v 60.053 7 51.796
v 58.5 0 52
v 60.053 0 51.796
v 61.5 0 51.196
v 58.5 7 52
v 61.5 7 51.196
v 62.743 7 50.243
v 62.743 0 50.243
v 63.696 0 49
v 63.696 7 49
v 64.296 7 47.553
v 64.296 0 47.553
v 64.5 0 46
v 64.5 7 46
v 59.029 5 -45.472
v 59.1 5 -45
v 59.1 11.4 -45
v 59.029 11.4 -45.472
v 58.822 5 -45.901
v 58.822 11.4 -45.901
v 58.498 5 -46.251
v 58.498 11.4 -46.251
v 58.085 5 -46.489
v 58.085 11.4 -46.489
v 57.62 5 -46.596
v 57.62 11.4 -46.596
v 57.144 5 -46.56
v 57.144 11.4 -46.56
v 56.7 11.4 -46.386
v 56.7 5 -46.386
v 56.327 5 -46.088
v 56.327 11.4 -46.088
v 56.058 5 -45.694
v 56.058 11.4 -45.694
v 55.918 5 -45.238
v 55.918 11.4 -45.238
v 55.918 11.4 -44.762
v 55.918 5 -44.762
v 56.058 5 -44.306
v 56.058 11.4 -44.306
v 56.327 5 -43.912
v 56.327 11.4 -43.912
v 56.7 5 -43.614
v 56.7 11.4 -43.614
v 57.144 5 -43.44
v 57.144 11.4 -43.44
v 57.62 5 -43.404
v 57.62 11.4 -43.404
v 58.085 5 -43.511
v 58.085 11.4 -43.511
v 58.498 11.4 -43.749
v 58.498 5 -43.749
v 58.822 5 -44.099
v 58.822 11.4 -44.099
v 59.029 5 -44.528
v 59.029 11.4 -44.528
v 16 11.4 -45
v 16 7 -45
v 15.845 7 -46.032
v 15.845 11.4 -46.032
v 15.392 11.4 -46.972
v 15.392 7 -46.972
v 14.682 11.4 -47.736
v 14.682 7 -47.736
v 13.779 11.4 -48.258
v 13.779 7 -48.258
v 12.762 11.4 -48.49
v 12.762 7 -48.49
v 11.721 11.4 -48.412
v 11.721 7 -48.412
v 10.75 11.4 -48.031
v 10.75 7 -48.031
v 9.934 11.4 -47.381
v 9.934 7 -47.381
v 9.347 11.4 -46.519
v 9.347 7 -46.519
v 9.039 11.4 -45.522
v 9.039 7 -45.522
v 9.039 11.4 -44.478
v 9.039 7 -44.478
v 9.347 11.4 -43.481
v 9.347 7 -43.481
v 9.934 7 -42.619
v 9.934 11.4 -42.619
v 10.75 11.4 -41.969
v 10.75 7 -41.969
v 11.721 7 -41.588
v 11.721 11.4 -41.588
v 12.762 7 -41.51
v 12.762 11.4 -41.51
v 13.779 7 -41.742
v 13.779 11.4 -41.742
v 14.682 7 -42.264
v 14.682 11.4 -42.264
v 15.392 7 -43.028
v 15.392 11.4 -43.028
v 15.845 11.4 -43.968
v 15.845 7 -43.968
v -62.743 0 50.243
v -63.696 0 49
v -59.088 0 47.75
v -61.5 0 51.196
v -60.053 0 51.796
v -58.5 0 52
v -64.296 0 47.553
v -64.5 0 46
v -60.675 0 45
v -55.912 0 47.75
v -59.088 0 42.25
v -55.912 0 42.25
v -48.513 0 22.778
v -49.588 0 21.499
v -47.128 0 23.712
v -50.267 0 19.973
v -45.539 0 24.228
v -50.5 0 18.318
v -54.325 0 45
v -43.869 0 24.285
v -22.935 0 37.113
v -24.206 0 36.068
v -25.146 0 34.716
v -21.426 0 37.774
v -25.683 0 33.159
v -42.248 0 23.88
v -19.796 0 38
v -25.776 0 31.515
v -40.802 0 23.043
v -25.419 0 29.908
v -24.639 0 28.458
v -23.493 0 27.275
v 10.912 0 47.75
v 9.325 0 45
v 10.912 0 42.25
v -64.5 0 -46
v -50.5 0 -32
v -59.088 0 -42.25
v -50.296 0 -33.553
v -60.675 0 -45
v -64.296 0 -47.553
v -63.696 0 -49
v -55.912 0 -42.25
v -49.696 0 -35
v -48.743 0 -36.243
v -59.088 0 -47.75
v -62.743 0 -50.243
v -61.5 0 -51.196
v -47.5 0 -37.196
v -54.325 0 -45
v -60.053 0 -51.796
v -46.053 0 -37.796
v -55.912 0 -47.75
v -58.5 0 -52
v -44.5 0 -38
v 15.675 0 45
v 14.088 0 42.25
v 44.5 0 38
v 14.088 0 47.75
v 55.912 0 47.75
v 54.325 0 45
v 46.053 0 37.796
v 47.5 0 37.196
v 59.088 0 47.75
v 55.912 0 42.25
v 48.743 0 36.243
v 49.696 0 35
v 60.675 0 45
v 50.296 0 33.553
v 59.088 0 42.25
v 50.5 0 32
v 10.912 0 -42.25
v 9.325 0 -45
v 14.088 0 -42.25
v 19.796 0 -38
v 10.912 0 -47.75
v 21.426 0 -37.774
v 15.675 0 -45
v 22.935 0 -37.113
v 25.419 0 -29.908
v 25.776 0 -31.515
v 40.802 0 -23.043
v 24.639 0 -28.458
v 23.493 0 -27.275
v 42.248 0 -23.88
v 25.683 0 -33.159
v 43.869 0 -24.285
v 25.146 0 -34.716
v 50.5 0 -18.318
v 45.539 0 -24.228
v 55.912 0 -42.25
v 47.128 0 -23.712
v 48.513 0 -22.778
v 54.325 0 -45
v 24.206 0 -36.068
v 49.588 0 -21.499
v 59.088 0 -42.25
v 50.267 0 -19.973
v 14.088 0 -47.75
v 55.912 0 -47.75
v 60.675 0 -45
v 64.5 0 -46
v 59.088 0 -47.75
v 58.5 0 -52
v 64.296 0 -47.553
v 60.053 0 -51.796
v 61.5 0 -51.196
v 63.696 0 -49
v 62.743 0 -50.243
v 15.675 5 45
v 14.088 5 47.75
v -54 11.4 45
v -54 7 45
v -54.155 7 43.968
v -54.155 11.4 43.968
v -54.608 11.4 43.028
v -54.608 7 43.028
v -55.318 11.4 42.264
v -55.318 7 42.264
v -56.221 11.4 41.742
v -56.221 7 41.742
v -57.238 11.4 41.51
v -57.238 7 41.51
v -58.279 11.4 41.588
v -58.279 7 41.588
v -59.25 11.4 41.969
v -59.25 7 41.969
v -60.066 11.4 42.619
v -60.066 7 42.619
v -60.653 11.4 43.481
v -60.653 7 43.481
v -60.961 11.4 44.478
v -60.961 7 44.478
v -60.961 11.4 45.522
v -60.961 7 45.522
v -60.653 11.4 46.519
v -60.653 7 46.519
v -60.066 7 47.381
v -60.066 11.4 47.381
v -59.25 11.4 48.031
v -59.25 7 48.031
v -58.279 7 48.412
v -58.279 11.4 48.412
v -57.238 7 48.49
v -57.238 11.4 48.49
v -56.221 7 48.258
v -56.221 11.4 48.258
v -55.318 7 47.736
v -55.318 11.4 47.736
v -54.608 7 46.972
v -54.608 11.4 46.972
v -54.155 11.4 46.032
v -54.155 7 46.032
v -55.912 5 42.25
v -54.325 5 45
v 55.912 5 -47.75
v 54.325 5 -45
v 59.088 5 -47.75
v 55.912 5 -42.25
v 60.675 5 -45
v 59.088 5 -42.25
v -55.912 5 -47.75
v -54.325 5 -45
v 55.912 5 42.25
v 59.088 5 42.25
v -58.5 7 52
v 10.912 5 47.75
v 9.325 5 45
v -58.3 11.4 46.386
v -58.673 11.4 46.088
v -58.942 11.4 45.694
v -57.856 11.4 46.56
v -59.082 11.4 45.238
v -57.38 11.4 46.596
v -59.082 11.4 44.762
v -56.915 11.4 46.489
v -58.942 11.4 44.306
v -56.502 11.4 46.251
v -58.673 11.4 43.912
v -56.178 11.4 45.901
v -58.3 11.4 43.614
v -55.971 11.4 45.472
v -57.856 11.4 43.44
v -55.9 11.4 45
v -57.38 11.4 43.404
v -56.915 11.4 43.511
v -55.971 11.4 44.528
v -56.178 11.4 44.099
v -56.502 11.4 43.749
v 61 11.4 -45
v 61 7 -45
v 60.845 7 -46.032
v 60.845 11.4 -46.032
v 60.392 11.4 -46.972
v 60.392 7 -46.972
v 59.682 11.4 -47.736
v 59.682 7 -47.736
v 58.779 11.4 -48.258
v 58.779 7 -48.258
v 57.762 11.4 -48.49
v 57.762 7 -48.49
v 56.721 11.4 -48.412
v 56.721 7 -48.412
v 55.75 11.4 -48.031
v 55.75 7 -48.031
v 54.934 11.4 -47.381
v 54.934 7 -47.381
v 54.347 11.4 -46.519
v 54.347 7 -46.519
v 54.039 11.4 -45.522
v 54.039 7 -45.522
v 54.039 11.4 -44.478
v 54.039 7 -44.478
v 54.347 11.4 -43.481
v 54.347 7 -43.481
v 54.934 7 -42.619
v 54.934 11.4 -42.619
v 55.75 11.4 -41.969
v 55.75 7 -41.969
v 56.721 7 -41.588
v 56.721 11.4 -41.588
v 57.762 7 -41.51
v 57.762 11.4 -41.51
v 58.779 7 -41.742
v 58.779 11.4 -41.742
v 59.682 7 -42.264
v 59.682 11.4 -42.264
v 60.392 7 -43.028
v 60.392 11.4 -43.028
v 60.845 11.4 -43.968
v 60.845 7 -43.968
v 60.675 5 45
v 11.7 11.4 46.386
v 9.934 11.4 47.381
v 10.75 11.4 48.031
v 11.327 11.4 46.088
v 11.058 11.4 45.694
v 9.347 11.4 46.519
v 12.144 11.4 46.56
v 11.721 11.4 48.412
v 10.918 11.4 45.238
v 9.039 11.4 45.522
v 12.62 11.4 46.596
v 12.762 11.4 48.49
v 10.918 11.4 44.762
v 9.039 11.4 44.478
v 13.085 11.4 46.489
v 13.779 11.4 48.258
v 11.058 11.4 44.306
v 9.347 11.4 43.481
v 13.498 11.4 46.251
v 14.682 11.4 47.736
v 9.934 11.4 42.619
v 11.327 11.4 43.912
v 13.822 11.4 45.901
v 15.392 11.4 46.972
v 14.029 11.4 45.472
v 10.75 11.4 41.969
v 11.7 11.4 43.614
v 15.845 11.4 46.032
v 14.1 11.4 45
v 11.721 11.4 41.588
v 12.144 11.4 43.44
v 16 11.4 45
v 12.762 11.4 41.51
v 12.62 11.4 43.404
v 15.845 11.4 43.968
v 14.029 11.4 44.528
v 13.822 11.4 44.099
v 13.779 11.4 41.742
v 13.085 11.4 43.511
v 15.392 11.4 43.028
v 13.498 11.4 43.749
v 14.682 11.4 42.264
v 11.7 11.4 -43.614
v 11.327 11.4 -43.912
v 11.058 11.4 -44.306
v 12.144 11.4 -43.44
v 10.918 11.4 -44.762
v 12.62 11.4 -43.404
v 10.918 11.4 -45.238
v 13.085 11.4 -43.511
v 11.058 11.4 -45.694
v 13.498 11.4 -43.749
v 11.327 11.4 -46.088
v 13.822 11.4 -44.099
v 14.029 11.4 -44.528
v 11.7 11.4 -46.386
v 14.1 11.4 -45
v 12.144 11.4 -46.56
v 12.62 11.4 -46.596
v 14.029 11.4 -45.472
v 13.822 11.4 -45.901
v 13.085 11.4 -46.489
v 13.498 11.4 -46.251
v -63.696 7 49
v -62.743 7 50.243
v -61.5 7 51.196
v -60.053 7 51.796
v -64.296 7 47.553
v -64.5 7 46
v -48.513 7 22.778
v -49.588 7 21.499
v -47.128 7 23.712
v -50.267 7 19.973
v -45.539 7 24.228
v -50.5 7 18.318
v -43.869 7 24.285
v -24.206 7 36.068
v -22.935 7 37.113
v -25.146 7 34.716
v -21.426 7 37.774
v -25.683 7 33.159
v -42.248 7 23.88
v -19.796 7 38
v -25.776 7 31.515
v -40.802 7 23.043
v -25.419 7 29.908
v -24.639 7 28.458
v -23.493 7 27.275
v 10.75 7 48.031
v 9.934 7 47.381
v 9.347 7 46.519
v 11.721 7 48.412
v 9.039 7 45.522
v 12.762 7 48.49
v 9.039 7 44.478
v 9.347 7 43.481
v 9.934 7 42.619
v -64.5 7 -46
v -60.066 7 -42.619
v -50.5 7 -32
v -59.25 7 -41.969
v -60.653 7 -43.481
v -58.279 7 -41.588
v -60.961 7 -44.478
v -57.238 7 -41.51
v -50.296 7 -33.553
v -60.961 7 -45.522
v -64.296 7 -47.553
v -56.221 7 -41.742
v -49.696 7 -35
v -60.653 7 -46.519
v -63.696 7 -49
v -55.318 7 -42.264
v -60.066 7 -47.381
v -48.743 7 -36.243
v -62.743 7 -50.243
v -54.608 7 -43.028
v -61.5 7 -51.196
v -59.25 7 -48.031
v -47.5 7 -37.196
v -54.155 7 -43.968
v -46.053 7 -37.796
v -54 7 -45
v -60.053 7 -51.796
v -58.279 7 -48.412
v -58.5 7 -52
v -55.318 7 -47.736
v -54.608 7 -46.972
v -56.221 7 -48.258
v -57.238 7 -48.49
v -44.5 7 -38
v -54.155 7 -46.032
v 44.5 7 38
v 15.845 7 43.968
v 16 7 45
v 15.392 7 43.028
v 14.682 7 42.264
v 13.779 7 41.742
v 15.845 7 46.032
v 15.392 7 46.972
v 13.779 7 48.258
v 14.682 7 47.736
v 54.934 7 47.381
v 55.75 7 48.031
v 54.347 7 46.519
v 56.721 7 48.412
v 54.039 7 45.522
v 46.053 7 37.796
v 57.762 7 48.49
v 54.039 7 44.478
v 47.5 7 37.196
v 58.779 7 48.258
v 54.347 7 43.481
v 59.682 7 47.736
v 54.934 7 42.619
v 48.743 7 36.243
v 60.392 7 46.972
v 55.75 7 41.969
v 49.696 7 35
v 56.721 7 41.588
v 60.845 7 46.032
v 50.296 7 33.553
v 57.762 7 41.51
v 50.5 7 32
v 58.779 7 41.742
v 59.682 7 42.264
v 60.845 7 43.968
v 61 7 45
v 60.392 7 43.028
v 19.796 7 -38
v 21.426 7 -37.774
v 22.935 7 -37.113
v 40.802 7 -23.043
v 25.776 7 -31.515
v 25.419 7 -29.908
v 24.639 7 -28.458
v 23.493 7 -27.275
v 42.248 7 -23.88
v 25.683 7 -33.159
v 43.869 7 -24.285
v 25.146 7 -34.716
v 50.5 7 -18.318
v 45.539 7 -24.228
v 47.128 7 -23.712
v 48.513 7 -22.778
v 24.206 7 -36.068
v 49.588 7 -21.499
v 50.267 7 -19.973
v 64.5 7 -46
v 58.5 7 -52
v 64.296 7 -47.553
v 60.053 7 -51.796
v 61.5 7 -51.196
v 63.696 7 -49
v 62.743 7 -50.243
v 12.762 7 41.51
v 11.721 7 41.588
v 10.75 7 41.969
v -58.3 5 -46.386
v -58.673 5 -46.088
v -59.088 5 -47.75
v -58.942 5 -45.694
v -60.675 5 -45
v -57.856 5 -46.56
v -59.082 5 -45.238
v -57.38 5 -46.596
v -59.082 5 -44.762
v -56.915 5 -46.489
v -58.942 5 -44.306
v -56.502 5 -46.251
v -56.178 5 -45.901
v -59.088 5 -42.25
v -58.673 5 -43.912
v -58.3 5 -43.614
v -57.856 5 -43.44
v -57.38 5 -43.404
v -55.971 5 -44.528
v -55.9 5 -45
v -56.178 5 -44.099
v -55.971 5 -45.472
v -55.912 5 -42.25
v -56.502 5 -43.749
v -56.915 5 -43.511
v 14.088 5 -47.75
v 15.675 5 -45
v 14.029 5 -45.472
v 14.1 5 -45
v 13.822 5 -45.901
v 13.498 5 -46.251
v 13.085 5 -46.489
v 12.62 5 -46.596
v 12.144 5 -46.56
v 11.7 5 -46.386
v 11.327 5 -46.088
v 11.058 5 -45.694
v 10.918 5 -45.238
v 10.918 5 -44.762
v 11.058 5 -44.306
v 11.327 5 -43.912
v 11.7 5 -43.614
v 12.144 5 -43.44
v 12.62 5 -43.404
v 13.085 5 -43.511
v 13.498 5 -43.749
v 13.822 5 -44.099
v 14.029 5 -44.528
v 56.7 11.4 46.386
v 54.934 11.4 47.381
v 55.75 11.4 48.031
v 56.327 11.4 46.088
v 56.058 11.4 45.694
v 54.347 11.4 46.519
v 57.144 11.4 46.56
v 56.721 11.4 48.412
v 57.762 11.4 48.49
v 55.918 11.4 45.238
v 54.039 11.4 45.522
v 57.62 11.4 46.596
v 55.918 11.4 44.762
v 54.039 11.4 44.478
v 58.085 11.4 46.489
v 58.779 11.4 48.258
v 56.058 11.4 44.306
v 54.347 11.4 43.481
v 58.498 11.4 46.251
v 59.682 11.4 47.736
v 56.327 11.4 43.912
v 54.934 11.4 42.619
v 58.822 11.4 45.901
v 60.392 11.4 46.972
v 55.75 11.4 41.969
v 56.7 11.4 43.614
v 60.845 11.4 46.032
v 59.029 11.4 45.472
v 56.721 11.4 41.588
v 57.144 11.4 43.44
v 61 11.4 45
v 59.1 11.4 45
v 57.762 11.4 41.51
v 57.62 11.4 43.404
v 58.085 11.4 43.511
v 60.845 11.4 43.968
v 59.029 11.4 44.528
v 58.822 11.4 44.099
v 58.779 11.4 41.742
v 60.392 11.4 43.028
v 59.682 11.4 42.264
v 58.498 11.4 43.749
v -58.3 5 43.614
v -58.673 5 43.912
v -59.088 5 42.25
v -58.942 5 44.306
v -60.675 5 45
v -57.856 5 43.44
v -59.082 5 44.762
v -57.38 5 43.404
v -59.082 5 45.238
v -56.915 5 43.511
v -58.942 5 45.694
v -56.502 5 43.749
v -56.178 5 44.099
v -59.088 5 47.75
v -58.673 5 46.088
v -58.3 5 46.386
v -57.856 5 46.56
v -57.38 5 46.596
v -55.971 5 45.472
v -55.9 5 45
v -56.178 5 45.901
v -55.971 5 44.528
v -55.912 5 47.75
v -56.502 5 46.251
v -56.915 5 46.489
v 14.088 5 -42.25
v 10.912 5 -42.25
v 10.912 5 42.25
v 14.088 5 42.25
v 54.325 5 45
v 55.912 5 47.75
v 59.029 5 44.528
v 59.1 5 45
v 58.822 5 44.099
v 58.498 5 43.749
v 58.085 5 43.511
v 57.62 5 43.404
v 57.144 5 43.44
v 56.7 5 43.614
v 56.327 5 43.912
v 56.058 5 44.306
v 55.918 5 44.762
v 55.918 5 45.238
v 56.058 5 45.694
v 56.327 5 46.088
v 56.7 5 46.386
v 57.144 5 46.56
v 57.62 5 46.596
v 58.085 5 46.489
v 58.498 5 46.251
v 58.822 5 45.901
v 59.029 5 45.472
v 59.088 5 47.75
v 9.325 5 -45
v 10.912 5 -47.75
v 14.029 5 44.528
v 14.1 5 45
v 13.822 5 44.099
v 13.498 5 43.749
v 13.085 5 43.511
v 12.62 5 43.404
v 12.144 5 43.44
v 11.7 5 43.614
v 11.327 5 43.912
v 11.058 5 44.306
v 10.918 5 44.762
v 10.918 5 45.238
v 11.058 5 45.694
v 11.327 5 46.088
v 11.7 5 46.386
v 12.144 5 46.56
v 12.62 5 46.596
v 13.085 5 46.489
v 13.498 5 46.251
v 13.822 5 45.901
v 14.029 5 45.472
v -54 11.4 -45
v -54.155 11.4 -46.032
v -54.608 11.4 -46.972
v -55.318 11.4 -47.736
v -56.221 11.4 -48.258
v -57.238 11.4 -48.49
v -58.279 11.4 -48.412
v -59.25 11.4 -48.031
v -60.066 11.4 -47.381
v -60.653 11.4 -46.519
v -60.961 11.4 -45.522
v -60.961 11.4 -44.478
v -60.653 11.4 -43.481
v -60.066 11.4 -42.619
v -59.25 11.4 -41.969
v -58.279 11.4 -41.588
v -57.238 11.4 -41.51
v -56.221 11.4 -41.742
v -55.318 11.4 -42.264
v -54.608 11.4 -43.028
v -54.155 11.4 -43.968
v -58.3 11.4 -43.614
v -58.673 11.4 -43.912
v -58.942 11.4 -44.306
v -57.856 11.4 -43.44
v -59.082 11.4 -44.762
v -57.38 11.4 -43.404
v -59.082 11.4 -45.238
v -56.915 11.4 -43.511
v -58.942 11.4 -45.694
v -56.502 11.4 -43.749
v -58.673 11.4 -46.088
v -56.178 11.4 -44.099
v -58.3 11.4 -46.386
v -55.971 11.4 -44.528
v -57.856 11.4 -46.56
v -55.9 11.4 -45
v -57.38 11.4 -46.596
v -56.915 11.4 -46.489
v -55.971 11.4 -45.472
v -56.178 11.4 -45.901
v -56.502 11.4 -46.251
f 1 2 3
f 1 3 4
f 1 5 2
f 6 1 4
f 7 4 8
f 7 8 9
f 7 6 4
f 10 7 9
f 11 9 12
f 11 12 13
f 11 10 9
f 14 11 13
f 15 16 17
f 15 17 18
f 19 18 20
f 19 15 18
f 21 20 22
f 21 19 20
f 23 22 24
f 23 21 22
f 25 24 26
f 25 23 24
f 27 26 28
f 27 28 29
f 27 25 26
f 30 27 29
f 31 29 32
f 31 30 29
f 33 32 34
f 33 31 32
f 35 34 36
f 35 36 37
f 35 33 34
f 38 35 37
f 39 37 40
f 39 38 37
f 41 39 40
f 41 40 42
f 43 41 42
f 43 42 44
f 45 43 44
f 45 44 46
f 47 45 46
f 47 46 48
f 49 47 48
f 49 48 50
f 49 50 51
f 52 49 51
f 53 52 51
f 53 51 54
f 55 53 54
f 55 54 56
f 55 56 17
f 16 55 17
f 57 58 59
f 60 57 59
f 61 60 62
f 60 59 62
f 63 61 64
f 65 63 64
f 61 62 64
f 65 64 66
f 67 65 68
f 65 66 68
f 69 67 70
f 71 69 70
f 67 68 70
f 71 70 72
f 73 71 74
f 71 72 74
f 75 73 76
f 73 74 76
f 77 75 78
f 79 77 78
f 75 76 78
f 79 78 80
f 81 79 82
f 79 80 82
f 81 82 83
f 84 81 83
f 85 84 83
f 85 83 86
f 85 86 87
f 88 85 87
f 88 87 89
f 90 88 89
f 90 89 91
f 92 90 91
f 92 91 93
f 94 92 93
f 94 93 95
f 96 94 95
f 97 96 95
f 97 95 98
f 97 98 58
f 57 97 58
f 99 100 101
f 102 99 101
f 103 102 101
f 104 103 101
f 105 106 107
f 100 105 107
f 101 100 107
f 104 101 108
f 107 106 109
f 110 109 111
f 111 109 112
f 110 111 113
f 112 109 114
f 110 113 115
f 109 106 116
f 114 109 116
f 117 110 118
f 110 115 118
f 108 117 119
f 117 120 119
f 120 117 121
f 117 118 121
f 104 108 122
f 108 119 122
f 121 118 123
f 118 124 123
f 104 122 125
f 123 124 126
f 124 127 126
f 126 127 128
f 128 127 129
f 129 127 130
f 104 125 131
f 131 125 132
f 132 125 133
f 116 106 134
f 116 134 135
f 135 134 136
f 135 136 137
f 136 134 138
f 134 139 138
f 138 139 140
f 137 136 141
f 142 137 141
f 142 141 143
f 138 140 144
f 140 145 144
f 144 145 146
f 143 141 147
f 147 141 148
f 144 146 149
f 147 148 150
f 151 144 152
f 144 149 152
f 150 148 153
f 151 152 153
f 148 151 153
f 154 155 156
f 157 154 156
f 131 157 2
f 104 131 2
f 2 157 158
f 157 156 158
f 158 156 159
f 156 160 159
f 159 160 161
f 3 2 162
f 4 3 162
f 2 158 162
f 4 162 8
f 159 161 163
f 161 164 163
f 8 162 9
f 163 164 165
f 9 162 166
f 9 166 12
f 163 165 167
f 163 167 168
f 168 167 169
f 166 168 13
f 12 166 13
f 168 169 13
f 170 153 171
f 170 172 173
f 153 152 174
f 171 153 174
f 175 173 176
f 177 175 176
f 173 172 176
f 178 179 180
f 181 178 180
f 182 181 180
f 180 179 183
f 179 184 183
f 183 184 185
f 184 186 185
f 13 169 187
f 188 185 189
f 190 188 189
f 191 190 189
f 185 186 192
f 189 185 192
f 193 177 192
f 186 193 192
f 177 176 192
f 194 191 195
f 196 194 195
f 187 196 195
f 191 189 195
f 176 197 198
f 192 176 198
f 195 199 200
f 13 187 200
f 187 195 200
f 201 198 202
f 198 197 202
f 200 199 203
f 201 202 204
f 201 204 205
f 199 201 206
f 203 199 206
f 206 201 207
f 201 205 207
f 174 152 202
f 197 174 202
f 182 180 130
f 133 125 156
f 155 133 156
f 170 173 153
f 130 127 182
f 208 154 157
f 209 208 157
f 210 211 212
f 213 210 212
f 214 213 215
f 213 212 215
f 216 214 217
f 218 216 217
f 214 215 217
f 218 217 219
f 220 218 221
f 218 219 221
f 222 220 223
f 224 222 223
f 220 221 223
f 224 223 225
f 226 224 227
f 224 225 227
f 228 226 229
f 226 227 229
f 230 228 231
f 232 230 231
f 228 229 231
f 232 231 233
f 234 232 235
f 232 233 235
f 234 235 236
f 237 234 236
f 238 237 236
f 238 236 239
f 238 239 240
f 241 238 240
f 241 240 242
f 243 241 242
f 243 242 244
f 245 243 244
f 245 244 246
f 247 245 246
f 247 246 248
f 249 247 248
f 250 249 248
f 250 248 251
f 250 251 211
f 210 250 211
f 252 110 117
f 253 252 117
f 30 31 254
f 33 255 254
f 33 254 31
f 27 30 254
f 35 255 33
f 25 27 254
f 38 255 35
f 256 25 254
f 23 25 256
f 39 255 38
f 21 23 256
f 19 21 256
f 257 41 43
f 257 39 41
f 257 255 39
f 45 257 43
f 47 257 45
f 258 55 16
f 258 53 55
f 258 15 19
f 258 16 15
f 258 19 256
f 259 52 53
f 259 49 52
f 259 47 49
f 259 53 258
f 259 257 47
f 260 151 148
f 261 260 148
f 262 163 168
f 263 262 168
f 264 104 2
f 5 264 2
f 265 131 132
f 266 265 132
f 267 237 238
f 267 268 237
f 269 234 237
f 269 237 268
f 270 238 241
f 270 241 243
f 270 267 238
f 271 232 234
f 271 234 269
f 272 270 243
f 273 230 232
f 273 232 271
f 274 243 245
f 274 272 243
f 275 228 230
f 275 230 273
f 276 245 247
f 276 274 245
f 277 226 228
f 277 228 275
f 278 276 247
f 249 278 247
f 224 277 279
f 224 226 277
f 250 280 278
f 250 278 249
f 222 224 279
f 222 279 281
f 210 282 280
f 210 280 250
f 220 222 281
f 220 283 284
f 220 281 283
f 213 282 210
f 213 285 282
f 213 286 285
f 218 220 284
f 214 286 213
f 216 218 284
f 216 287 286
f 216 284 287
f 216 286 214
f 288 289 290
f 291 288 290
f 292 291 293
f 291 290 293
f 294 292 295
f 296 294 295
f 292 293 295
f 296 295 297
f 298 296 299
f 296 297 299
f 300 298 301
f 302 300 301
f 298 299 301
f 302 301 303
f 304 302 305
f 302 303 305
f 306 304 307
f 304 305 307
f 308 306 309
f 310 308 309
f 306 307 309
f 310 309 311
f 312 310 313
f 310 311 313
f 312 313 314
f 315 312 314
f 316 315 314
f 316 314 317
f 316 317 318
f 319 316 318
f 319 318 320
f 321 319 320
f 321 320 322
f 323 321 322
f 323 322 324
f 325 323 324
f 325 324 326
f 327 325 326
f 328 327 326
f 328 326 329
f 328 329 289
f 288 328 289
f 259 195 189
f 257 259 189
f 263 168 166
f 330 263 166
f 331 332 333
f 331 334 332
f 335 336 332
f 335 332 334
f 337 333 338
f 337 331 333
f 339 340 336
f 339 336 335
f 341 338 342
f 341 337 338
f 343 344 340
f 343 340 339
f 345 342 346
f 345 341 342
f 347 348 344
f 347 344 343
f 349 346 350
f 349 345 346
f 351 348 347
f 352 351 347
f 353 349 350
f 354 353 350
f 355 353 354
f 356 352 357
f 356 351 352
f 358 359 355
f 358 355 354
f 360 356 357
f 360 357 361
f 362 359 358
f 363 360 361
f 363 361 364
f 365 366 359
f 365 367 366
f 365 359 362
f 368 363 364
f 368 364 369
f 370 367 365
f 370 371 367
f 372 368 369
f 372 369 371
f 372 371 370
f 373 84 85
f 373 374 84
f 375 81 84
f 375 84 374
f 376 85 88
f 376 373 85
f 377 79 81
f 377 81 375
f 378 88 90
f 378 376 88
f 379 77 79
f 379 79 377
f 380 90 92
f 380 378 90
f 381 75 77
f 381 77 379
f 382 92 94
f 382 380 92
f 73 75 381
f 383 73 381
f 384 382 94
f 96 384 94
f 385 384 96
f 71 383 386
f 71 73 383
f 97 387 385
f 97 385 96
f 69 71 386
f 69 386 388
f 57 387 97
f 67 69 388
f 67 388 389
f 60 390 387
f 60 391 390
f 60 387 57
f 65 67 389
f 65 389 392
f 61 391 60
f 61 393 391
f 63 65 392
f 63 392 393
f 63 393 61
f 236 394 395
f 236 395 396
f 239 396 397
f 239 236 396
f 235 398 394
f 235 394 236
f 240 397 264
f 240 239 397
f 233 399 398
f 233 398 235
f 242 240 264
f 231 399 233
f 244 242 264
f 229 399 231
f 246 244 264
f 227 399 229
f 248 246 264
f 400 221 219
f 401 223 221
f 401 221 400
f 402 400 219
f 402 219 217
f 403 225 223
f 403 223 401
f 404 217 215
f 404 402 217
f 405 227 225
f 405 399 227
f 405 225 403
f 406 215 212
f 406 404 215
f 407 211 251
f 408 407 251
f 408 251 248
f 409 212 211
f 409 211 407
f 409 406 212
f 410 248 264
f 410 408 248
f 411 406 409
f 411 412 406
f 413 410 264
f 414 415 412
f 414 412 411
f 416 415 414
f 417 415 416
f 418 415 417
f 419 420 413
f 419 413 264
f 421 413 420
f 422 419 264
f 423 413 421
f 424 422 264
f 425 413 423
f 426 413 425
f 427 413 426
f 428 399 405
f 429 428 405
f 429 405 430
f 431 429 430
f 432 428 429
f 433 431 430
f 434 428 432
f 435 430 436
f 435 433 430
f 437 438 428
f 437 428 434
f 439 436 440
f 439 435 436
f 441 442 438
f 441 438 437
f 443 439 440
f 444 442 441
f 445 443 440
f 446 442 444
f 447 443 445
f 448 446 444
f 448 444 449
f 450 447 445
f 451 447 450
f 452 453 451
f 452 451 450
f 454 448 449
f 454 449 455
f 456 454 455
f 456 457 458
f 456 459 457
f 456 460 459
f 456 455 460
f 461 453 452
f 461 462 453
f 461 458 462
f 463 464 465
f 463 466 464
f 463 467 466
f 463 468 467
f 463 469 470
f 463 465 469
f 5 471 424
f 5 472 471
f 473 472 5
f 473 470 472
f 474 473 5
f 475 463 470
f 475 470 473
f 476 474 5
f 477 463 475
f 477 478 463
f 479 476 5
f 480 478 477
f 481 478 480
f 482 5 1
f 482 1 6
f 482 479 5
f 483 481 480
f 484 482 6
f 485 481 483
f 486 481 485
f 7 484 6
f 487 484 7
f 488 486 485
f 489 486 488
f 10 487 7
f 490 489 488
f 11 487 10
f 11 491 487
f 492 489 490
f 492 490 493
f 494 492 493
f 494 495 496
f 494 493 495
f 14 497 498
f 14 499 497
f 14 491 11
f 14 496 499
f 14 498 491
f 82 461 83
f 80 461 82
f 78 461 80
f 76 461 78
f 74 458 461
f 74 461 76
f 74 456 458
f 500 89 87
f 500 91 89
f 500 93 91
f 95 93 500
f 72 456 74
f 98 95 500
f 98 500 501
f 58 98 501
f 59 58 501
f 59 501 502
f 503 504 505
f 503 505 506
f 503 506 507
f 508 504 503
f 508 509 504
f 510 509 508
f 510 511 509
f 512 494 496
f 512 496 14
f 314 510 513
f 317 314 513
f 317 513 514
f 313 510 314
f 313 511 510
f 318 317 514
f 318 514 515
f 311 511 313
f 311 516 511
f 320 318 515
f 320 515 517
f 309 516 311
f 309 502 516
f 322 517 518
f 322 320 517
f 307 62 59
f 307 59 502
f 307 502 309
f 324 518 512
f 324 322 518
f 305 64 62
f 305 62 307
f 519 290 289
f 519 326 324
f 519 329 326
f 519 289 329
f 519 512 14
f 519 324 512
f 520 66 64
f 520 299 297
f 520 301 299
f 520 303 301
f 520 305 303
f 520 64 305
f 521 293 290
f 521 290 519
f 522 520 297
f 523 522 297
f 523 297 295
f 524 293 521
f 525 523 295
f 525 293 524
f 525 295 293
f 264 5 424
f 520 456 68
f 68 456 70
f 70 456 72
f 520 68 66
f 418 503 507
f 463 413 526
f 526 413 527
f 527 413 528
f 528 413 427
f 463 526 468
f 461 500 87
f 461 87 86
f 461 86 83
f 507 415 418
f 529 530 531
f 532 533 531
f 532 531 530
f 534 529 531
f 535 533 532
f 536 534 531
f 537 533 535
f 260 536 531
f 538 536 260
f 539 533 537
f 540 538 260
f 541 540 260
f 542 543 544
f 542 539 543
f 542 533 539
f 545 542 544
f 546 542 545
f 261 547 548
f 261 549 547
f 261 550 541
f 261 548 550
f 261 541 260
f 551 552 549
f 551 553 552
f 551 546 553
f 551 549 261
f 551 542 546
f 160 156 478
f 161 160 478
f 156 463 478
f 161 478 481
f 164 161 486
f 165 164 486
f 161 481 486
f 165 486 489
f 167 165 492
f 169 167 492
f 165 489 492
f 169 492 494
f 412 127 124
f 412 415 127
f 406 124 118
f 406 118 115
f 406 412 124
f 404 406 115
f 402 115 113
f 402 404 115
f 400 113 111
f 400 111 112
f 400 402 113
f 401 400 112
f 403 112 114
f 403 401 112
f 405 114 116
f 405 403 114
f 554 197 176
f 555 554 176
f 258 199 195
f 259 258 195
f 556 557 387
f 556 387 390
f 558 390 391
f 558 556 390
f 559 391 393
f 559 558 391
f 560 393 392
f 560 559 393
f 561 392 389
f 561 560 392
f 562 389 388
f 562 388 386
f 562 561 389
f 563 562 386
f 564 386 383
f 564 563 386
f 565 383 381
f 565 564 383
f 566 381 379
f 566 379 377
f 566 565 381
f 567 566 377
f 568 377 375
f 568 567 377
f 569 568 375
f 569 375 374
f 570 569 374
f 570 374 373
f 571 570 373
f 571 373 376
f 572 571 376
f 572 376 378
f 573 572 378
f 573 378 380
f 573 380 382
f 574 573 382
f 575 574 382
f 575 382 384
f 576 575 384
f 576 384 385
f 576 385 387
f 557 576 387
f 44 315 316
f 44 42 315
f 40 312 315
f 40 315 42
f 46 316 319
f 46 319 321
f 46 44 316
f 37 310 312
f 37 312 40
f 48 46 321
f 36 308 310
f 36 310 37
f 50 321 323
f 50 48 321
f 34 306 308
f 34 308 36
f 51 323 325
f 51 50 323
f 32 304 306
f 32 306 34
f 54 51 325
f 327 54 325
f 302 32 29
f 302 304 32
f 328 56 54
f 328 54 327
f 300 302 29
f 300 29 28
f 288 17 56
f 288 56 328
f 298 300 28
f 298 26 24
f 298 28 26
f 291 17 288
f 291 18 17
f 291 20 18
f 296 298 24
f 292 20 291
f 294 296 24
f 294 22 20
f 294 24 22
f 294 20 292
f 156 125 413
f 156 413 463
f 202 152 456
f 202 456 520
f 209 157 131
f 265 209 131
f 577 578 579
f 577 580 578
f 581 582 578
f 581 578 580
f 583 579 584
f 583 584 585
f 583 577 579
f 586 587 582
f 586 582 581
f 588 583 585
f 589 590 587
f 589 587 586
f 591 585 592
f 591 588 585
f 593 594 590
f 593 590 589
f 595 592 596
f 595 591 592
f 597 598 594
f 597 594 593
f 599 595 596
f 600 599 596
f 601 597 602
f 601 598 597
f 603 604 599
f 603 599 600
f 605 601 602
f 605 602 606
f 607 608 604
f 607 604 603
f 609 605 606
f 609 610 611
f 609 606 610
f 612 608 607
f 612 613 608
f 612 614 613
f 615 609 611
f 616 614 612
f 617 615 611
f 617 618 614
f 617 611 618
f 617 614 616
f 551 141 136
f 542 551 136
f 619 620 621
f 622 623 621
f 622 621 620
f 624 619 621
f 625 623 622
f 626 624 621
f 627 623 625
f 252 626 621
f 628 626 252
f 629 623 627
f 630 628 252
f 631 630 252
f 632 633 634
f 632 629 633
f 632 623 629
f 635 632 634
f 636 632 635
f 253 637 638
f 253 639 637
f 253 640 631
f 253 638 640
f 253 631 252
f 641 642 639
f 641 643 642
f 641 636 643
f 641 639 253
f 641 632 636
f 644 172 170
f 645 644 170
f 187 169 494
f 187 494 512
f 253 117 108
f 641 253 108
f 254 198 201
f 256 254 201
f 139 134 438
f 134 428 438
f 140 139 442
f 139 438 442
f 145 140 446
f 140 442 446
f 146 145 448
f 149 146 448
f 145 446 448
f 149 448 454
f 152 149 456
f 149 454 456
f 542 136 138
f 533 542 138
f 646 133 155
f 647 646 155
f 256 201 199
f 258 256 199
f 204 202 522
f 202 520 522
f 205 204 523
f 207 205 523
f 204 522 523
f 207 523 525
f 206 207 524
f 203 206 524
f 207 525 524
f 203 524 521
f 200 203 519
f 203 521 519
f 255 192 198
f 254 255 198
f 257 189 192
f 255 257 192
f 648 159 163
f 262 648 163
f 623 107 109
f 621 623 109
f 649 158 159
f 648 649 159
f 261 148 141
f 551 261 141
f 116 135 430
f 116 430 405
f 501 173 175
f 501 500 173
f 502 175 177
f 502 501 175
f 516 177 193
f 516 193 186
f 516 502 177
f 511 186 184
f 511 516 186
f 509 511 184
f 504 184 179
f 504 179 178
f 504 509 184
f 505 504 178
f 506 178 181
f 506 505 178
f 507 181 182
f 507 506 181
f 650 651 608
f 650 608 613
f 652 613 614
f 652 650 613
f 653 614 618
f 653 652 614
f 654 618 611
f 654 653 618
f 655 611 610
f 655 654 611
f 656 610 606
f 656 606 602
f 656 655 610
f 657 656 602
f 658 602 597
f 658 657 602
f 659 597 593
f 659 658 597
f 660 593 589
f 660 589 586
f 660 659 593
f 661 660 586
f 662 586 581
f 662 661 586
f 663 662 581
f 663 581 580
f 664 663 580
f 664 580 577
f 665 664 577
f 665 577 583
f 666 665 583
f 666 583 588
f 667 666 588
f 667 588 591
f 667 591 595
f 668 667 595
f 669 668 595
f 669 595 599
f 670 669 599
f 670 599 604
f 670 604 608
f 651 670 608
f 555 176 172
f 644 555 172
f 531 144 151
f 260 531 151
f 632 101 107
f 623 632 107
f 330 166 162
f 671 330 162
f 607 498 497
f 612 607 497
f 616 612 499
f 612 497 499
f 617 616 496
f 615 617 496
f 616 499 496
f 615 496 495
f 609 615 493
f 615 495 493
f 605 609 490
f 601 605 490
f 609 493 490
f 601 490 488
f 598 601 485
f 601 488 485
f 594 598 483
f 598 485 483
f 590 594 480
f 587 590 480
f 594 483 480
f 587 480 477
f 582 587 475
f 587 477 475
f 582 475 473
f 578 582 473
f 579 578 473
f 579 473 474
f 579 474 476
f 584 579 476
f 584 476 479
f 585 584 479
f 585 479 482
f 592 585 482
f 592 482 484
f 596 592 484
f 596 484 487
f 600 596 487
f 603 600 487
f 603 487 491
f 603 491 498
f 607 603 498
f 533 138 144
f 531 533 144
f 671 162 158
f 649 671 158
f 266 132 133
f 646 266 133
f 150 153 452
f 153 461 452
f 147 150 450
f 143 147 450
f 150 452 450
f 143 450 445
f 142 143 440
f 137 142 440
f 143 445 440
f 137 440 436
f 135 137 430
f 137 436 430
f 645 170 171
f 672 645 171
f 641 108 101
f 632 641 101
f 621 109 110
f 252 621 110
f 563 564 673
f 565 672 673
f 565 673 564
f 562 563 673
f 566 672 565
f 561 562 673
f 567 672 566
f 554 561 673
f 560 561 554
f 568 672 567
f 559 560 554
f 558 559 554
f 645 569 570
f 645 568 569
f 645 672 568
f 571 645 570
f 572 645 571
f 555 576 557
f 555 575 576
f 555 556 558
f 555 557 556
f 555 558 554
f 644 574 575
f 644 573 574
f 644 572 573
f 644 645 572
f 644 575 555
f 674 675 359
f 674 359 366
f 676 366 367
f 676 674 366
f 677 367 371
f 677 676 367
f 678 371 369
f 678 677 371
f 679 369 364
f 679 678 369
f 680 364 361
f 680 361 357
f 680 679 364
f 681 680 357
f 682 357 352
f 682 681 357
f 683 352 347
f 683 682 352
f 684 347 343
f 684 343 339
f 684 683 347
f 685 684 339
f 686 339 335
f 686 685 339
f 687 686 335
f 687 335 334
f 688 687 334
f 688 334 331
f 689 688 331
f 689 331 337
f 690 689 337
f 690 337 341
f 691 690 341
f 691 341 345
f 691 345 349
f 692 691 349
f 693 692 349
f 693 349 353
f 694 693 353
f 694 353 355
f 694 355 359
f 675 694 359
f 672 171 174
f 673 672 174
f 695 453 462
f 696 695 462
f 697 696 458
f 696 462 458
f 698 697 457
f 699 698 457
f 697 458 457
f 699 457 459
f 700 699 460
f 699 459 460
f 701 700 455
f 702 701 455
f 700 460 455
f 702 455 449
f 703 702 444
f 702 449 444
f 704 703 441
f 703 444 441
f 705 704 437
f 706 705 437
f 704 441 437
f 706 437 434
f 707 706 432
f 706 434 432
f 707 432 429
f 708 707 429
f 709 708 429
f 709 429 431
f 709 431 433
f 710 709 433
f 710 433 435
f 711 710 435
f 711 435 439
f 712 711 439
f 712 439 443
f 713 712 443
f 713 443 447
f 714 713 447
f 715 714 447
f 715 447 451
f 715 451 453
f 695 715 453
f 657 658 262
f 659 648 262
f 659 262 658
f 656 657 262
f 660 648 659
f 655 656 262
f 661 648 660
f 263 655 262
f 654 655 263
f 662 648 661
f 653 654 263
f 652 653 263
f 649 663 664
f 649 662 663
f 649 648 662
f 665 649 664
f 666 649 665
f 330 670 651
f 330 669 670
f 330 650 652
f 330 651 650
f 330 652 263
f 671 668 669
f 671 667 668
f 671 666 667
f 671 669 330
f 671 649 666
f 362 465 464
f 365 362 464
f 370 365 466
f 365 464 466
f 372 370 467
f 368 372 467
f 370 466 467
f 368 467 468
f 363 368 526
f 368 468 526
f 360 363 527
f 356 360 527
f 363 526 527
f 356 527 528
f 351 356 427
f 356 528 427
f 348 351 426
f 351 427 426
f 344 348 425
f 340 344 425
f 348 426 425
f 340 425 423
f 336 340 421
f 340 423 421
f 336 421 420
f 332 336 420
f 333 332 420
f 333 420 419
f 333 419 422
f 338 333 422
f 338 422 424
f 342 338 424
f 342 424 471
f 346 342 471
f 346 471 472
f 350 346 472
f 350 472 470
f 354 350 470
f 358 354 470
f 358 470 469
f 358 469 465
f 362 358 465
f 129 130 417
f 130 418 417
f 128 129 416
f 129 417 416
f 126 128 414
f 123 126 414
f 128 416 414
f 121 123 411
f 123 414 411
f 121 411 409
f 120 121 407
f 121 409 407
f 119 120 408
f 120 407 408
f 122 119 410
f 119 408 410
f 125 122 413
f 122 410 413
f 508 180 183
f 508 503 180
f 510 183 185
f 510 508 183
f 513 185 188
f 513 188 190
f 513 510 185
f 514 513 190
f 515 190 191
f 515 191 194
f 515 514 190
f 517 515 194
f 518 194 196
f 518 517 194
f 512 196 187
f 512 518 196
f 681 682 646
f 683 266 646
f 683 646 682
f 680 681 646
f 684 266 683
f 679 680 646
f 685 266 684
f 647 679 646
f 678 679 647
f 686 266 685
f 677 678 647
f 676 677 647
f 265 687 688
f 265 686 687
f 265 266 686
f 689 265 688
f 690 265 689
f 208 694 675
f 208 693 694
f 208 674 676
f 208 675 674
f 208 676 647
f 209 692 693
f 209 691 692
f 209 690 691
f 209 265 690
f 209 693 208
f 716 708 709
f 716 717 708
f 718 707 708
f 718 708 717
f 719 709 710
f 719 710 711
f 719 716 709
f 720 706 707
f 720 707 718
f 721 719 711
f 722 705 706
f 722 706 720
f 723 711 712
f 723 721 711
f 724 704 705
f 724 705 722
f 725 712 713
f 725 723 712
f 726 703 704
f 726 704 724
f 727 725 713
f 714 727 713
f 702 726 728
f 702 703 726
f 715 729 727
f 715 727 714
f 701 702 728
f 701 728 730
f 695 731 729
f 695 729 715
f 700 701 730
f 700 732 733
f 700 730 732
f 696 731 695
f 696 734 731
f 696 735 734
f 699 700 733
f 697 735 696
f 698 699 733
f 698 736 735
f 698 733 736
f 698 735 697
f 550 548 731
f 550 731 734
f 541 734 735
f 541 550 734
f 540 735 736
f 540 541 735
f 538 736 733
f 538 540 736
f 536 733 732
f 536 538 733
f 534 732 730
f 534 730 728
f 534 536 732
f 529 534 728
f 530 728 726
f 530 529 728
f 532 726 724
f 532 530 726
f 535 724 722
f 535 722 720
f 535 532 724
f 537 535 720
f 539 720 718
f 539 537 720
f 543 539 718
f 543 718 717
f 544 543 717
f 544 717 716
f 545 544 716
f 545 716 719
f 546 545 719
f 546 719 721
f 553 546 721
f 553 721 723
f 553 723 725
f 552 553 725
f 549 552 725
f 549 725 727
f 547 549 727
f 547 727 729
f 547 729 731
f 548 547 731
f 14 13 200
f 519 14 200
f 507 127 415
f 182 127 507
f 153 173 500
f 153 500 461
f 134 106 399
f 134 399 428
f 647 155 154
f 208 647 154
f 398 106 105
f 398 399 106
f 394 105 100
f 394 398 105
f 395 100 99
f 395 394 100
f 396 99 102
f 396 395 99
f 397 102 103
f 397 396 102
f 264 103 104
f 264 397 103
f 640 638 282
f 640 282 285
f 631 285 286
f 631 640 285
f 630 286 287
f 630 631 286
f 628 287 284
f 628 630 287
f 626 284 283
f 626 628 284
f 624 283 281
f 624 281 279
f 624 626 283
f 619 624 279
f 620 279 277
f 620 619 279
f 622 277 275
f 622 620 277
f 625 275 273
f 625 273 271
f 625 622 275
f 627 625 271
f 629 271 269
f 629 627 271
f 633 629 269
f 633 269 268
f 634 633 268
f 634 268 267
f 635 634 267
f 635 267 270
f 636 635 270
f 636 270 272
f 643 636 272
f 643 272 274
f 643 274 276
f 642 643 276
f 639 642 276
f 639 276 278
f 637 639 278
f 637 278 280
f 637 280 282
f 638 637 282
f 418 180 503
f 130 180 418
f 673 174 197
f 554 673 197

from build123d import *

# Parameters (mm, degrees)
SKETCH1_W           = 129
SKETCH1_H           = 104
SKETCH1_R           = 3.5
BOSS_EXTRUDE1_DEPTH = 7
FILLET1_R           = 6
SKETCH1_3_R         = 3.5
SKETCH1_3_R_2       = 1.6
BOSS_EXTRUDE2_DEPTH = 11.4
SKETCH2_R           = 1.6
CUT_EXTRUDE1_DEPTH  = 5


with BuildPart() as part:
    # Sketch1 → Boss-Extrude1 (new body)
    with BuildSketch(Plane(origin=(0, 0, 0), x_dir=(1, 0, 0), z_dir=(0, 1, 0))):
        Rectangle(SKETCH1_W, SKETCH1_H)
        with Locations((-57.5, -45)):
            Circle(SKETCH1_R, mode=Mode.SUBTRACT)
        with Locations((12.5, -45)):
            Circle(SKETCH1_R, mode=Mode.SUBTRACT)
        with Locations((57.5, -45)):
            Circle(SKETCH1_R, mode=Mode.SUBTRACT)
        Polygon((50.5, 30.63290669), (50.5, -38), (-37.197602993, -38), align=None, mode=Mode.SUBTRACT)
        Polygon((37.197602993, 38), (-50.5, -30.63290669), (-50.5, 38), align=None, mode=Mode.SUBTRACT)
        with Locations((-57.5, 45)):
            Circle(SKETCH1_R, mode=Mode.SUBTRACT)
        with Locations((12.5, 45)):
            Circle(SKETCH1_R, mode=Mode.SUBTRACT)
        with Locations((57.5, 45)):
            Circle(SKETCH1_R, mode=Mode.SUBTRACT)
    extrude(amount=BOSS_EXTRUDE1_DEPTH)

    # Fillet1
    fillet1_edges = [part.edges().sort_by_distance(p)[0] for p in [
        (-64.5, 3.5, -52),
        (64.5, 3.5, -52),
        (64.5, 3.5, 52),
        (-37.197602993, 3.5, 38),
        (50.5, 3.5, 38),
        (50.5, 3.5, -30.63290669),
        (-50.5, 3.5, 30.63290669),
        (37.197602993, 3.5, -38),
        (-64.5, 3.5, 52),
        (-50.5, 3.5, -38),
    ]]
    fillet(fillet1_edges, radius=FILLET1_R)

    # Sketch1<3> → Boss-Extrude2 (add)
    # profile 1 of 6: a face of its own
    with BuildSketch(Plane(origin=(0, 0, 0), x_dir=(1, 0, 0), z_dir=(0, 1, 0))):
        with Locations((-57.5, 45)):
            Circle(SKETCH1_3_R)
        with Locations((-57.5, 45)):
            Circle(SKETCH1_3_R_2, mode=Mode.SUBTRACT)
    # profile 2 of 6: a face of its own
    with BuildSketch(Plane(origin=(0, 0, 0), x_dir=(1, 0, 0), z_dir=(0, 1, 0))):
        with Locations((12.5, 45)):
            Circle(SKETCH1_3_R)
        with Locations((12.5, 45)):
            Circle(SKETCH1_3_R_2, mode=Mode.SUBTRACT)
    # profile 3 of 6: a face of its own
    with BuildSketch(Plane(origin=(0, 0, 0), x_dir=(1, 0, 0), z_dir=(0, 1, 0))):
        with Locations((57.5, 45)):
            Circle(SKETCH1_3_R)
        with Locations((57.5, 45)):
            Circle(SKETCH1_3_R_2, mode=Mode.SUBTRACT)
    # profile 4 of 6: a face of its own
    with BuildSketch(Plane(origin=(0, 0, 0), x_dir=(1, 0, 0), z_dir=(0, 1, 0))):
        with Locations((-57.5, -45)):
            Circle(SKETCH1_3_R)
        with Locations((-57.5, -45)):
            Circle(SKETCH1_3_R_2, mode=Mode.SUBTRACT)
    # profile 5 of 6: a face of its own
    with BuildSketch(Plane(origin=(0, 0, 0), x_dir=(1, 0, 0), z_dir=(0, 1, 0))):
        with Locations((12.5, -45)):
            Circle(SKETCH1_3_R)
        with Locations((12.5, -45)):
            Circle(SKETCH1_3_R_2, mode=Mode.SUBTRACT)
    # profile 6 of 6: a face of its own
    with BuildSketch(Plane(origin=(0, 0, 0), x_dir=(1, 0, 0), z_dir=(0, 1, 0))):
        with Locations((57.5, -45)):
            Circle(SKETCH1_3_R)
        with Locations((57.5, -45)):
            Circle(SKETCH1_3_R_2, mode=Mode.SUBTRACT)
    extrude(amount=BOSS_EXTRUDE2_DEPTH)

    # Sketch2 → Cut-Extrude1 (cut)
    # profile 1 of 6: a face of its own
    with BuildSketch(Plane.XZ):
        Polygon((-54.324573519, 45), (-55.91228676, 47.75), (-59.08771324, 47.75), (-60.675426481, 45), (-59.08771324, 42.25), (-55.91228676, 42.25), align=None)
        with Locations((-57.5, 45)):
            Circle(SKETCH2_R, mode=Mode.SUBTRACT)
    # profile 2 of 6: a face of its own
    with BuildSketch(Plane.XZ):
        Polygon((15.675426481, 45), (14.08771324, 47.75), (10.91228676, 47.75), (9.324573519, 45), (10.91228676, 42.25), (14.08771324, 42.25), align=None)
        with Locations((12.5, 45)):
            Circle(SKETCH2_R, mode=Mode.SUBTRACT)
    # profile 3 of 6: a face of its own
    with BuildSketch(Plane.XZ):
        Polygon((60.675426481, 45), (59.08771324, 47.75), (55.91228676, 47.75), (54.324573519, 45), (55.91228676, 42.25), (59.08771324, 42.25), align=None)
        with Locations((57.5, 45)):
            Circle(SKETCH2_R, mode=Mode.SUBTRACT)
    # profile 4 of 6: a face of its own
    with BuildSketch(Plane.XZ):
        Polygon((-54.324573519, -45), (-55.91228676, -42.25), (-59.08771324, -42.25), (-60.675426481, -45), (-59.08771324, -47.75), (-55.91228676, -47.75), align=None)
        with Locations((-57.5, -45)):
            Circle(SKETCH2_R, mode=Mode.SUBTRACT)
    # profile 5 of 6: a face of its own
    with BuildSketch(Plane.XZ):
        Polygon((15.675426481, -45), (14.08771324, -42.25), (10.91228676, -42.25), (9.324573519, -45), (10.91228676, -47.75), (14.08771324, -47.75), align=None)
        with Locations((12.5, -45)):
            Circle(SKETCH2_R, mode=Mode.SUBTRACT)
    # profile 6 of 6: a face of its own
    with BuildSketch(Plane.XZ):
        Polygon((60.675426481, -45), (59.08771324, -42.25), (55.91228676, -42.25), (54.324573519, -45), (55.91228676, -47.75), (59.08771324, -47.75), align=None)
        with Locations((57.5, -45)):
            Circle(SKETCH2_R, mode=Mode.SUBTRACT)
    extrude(amount=-CUT_EXTRUDE1_DEPTH, mode=Mode.SUBTRACT)


solid = part.part
